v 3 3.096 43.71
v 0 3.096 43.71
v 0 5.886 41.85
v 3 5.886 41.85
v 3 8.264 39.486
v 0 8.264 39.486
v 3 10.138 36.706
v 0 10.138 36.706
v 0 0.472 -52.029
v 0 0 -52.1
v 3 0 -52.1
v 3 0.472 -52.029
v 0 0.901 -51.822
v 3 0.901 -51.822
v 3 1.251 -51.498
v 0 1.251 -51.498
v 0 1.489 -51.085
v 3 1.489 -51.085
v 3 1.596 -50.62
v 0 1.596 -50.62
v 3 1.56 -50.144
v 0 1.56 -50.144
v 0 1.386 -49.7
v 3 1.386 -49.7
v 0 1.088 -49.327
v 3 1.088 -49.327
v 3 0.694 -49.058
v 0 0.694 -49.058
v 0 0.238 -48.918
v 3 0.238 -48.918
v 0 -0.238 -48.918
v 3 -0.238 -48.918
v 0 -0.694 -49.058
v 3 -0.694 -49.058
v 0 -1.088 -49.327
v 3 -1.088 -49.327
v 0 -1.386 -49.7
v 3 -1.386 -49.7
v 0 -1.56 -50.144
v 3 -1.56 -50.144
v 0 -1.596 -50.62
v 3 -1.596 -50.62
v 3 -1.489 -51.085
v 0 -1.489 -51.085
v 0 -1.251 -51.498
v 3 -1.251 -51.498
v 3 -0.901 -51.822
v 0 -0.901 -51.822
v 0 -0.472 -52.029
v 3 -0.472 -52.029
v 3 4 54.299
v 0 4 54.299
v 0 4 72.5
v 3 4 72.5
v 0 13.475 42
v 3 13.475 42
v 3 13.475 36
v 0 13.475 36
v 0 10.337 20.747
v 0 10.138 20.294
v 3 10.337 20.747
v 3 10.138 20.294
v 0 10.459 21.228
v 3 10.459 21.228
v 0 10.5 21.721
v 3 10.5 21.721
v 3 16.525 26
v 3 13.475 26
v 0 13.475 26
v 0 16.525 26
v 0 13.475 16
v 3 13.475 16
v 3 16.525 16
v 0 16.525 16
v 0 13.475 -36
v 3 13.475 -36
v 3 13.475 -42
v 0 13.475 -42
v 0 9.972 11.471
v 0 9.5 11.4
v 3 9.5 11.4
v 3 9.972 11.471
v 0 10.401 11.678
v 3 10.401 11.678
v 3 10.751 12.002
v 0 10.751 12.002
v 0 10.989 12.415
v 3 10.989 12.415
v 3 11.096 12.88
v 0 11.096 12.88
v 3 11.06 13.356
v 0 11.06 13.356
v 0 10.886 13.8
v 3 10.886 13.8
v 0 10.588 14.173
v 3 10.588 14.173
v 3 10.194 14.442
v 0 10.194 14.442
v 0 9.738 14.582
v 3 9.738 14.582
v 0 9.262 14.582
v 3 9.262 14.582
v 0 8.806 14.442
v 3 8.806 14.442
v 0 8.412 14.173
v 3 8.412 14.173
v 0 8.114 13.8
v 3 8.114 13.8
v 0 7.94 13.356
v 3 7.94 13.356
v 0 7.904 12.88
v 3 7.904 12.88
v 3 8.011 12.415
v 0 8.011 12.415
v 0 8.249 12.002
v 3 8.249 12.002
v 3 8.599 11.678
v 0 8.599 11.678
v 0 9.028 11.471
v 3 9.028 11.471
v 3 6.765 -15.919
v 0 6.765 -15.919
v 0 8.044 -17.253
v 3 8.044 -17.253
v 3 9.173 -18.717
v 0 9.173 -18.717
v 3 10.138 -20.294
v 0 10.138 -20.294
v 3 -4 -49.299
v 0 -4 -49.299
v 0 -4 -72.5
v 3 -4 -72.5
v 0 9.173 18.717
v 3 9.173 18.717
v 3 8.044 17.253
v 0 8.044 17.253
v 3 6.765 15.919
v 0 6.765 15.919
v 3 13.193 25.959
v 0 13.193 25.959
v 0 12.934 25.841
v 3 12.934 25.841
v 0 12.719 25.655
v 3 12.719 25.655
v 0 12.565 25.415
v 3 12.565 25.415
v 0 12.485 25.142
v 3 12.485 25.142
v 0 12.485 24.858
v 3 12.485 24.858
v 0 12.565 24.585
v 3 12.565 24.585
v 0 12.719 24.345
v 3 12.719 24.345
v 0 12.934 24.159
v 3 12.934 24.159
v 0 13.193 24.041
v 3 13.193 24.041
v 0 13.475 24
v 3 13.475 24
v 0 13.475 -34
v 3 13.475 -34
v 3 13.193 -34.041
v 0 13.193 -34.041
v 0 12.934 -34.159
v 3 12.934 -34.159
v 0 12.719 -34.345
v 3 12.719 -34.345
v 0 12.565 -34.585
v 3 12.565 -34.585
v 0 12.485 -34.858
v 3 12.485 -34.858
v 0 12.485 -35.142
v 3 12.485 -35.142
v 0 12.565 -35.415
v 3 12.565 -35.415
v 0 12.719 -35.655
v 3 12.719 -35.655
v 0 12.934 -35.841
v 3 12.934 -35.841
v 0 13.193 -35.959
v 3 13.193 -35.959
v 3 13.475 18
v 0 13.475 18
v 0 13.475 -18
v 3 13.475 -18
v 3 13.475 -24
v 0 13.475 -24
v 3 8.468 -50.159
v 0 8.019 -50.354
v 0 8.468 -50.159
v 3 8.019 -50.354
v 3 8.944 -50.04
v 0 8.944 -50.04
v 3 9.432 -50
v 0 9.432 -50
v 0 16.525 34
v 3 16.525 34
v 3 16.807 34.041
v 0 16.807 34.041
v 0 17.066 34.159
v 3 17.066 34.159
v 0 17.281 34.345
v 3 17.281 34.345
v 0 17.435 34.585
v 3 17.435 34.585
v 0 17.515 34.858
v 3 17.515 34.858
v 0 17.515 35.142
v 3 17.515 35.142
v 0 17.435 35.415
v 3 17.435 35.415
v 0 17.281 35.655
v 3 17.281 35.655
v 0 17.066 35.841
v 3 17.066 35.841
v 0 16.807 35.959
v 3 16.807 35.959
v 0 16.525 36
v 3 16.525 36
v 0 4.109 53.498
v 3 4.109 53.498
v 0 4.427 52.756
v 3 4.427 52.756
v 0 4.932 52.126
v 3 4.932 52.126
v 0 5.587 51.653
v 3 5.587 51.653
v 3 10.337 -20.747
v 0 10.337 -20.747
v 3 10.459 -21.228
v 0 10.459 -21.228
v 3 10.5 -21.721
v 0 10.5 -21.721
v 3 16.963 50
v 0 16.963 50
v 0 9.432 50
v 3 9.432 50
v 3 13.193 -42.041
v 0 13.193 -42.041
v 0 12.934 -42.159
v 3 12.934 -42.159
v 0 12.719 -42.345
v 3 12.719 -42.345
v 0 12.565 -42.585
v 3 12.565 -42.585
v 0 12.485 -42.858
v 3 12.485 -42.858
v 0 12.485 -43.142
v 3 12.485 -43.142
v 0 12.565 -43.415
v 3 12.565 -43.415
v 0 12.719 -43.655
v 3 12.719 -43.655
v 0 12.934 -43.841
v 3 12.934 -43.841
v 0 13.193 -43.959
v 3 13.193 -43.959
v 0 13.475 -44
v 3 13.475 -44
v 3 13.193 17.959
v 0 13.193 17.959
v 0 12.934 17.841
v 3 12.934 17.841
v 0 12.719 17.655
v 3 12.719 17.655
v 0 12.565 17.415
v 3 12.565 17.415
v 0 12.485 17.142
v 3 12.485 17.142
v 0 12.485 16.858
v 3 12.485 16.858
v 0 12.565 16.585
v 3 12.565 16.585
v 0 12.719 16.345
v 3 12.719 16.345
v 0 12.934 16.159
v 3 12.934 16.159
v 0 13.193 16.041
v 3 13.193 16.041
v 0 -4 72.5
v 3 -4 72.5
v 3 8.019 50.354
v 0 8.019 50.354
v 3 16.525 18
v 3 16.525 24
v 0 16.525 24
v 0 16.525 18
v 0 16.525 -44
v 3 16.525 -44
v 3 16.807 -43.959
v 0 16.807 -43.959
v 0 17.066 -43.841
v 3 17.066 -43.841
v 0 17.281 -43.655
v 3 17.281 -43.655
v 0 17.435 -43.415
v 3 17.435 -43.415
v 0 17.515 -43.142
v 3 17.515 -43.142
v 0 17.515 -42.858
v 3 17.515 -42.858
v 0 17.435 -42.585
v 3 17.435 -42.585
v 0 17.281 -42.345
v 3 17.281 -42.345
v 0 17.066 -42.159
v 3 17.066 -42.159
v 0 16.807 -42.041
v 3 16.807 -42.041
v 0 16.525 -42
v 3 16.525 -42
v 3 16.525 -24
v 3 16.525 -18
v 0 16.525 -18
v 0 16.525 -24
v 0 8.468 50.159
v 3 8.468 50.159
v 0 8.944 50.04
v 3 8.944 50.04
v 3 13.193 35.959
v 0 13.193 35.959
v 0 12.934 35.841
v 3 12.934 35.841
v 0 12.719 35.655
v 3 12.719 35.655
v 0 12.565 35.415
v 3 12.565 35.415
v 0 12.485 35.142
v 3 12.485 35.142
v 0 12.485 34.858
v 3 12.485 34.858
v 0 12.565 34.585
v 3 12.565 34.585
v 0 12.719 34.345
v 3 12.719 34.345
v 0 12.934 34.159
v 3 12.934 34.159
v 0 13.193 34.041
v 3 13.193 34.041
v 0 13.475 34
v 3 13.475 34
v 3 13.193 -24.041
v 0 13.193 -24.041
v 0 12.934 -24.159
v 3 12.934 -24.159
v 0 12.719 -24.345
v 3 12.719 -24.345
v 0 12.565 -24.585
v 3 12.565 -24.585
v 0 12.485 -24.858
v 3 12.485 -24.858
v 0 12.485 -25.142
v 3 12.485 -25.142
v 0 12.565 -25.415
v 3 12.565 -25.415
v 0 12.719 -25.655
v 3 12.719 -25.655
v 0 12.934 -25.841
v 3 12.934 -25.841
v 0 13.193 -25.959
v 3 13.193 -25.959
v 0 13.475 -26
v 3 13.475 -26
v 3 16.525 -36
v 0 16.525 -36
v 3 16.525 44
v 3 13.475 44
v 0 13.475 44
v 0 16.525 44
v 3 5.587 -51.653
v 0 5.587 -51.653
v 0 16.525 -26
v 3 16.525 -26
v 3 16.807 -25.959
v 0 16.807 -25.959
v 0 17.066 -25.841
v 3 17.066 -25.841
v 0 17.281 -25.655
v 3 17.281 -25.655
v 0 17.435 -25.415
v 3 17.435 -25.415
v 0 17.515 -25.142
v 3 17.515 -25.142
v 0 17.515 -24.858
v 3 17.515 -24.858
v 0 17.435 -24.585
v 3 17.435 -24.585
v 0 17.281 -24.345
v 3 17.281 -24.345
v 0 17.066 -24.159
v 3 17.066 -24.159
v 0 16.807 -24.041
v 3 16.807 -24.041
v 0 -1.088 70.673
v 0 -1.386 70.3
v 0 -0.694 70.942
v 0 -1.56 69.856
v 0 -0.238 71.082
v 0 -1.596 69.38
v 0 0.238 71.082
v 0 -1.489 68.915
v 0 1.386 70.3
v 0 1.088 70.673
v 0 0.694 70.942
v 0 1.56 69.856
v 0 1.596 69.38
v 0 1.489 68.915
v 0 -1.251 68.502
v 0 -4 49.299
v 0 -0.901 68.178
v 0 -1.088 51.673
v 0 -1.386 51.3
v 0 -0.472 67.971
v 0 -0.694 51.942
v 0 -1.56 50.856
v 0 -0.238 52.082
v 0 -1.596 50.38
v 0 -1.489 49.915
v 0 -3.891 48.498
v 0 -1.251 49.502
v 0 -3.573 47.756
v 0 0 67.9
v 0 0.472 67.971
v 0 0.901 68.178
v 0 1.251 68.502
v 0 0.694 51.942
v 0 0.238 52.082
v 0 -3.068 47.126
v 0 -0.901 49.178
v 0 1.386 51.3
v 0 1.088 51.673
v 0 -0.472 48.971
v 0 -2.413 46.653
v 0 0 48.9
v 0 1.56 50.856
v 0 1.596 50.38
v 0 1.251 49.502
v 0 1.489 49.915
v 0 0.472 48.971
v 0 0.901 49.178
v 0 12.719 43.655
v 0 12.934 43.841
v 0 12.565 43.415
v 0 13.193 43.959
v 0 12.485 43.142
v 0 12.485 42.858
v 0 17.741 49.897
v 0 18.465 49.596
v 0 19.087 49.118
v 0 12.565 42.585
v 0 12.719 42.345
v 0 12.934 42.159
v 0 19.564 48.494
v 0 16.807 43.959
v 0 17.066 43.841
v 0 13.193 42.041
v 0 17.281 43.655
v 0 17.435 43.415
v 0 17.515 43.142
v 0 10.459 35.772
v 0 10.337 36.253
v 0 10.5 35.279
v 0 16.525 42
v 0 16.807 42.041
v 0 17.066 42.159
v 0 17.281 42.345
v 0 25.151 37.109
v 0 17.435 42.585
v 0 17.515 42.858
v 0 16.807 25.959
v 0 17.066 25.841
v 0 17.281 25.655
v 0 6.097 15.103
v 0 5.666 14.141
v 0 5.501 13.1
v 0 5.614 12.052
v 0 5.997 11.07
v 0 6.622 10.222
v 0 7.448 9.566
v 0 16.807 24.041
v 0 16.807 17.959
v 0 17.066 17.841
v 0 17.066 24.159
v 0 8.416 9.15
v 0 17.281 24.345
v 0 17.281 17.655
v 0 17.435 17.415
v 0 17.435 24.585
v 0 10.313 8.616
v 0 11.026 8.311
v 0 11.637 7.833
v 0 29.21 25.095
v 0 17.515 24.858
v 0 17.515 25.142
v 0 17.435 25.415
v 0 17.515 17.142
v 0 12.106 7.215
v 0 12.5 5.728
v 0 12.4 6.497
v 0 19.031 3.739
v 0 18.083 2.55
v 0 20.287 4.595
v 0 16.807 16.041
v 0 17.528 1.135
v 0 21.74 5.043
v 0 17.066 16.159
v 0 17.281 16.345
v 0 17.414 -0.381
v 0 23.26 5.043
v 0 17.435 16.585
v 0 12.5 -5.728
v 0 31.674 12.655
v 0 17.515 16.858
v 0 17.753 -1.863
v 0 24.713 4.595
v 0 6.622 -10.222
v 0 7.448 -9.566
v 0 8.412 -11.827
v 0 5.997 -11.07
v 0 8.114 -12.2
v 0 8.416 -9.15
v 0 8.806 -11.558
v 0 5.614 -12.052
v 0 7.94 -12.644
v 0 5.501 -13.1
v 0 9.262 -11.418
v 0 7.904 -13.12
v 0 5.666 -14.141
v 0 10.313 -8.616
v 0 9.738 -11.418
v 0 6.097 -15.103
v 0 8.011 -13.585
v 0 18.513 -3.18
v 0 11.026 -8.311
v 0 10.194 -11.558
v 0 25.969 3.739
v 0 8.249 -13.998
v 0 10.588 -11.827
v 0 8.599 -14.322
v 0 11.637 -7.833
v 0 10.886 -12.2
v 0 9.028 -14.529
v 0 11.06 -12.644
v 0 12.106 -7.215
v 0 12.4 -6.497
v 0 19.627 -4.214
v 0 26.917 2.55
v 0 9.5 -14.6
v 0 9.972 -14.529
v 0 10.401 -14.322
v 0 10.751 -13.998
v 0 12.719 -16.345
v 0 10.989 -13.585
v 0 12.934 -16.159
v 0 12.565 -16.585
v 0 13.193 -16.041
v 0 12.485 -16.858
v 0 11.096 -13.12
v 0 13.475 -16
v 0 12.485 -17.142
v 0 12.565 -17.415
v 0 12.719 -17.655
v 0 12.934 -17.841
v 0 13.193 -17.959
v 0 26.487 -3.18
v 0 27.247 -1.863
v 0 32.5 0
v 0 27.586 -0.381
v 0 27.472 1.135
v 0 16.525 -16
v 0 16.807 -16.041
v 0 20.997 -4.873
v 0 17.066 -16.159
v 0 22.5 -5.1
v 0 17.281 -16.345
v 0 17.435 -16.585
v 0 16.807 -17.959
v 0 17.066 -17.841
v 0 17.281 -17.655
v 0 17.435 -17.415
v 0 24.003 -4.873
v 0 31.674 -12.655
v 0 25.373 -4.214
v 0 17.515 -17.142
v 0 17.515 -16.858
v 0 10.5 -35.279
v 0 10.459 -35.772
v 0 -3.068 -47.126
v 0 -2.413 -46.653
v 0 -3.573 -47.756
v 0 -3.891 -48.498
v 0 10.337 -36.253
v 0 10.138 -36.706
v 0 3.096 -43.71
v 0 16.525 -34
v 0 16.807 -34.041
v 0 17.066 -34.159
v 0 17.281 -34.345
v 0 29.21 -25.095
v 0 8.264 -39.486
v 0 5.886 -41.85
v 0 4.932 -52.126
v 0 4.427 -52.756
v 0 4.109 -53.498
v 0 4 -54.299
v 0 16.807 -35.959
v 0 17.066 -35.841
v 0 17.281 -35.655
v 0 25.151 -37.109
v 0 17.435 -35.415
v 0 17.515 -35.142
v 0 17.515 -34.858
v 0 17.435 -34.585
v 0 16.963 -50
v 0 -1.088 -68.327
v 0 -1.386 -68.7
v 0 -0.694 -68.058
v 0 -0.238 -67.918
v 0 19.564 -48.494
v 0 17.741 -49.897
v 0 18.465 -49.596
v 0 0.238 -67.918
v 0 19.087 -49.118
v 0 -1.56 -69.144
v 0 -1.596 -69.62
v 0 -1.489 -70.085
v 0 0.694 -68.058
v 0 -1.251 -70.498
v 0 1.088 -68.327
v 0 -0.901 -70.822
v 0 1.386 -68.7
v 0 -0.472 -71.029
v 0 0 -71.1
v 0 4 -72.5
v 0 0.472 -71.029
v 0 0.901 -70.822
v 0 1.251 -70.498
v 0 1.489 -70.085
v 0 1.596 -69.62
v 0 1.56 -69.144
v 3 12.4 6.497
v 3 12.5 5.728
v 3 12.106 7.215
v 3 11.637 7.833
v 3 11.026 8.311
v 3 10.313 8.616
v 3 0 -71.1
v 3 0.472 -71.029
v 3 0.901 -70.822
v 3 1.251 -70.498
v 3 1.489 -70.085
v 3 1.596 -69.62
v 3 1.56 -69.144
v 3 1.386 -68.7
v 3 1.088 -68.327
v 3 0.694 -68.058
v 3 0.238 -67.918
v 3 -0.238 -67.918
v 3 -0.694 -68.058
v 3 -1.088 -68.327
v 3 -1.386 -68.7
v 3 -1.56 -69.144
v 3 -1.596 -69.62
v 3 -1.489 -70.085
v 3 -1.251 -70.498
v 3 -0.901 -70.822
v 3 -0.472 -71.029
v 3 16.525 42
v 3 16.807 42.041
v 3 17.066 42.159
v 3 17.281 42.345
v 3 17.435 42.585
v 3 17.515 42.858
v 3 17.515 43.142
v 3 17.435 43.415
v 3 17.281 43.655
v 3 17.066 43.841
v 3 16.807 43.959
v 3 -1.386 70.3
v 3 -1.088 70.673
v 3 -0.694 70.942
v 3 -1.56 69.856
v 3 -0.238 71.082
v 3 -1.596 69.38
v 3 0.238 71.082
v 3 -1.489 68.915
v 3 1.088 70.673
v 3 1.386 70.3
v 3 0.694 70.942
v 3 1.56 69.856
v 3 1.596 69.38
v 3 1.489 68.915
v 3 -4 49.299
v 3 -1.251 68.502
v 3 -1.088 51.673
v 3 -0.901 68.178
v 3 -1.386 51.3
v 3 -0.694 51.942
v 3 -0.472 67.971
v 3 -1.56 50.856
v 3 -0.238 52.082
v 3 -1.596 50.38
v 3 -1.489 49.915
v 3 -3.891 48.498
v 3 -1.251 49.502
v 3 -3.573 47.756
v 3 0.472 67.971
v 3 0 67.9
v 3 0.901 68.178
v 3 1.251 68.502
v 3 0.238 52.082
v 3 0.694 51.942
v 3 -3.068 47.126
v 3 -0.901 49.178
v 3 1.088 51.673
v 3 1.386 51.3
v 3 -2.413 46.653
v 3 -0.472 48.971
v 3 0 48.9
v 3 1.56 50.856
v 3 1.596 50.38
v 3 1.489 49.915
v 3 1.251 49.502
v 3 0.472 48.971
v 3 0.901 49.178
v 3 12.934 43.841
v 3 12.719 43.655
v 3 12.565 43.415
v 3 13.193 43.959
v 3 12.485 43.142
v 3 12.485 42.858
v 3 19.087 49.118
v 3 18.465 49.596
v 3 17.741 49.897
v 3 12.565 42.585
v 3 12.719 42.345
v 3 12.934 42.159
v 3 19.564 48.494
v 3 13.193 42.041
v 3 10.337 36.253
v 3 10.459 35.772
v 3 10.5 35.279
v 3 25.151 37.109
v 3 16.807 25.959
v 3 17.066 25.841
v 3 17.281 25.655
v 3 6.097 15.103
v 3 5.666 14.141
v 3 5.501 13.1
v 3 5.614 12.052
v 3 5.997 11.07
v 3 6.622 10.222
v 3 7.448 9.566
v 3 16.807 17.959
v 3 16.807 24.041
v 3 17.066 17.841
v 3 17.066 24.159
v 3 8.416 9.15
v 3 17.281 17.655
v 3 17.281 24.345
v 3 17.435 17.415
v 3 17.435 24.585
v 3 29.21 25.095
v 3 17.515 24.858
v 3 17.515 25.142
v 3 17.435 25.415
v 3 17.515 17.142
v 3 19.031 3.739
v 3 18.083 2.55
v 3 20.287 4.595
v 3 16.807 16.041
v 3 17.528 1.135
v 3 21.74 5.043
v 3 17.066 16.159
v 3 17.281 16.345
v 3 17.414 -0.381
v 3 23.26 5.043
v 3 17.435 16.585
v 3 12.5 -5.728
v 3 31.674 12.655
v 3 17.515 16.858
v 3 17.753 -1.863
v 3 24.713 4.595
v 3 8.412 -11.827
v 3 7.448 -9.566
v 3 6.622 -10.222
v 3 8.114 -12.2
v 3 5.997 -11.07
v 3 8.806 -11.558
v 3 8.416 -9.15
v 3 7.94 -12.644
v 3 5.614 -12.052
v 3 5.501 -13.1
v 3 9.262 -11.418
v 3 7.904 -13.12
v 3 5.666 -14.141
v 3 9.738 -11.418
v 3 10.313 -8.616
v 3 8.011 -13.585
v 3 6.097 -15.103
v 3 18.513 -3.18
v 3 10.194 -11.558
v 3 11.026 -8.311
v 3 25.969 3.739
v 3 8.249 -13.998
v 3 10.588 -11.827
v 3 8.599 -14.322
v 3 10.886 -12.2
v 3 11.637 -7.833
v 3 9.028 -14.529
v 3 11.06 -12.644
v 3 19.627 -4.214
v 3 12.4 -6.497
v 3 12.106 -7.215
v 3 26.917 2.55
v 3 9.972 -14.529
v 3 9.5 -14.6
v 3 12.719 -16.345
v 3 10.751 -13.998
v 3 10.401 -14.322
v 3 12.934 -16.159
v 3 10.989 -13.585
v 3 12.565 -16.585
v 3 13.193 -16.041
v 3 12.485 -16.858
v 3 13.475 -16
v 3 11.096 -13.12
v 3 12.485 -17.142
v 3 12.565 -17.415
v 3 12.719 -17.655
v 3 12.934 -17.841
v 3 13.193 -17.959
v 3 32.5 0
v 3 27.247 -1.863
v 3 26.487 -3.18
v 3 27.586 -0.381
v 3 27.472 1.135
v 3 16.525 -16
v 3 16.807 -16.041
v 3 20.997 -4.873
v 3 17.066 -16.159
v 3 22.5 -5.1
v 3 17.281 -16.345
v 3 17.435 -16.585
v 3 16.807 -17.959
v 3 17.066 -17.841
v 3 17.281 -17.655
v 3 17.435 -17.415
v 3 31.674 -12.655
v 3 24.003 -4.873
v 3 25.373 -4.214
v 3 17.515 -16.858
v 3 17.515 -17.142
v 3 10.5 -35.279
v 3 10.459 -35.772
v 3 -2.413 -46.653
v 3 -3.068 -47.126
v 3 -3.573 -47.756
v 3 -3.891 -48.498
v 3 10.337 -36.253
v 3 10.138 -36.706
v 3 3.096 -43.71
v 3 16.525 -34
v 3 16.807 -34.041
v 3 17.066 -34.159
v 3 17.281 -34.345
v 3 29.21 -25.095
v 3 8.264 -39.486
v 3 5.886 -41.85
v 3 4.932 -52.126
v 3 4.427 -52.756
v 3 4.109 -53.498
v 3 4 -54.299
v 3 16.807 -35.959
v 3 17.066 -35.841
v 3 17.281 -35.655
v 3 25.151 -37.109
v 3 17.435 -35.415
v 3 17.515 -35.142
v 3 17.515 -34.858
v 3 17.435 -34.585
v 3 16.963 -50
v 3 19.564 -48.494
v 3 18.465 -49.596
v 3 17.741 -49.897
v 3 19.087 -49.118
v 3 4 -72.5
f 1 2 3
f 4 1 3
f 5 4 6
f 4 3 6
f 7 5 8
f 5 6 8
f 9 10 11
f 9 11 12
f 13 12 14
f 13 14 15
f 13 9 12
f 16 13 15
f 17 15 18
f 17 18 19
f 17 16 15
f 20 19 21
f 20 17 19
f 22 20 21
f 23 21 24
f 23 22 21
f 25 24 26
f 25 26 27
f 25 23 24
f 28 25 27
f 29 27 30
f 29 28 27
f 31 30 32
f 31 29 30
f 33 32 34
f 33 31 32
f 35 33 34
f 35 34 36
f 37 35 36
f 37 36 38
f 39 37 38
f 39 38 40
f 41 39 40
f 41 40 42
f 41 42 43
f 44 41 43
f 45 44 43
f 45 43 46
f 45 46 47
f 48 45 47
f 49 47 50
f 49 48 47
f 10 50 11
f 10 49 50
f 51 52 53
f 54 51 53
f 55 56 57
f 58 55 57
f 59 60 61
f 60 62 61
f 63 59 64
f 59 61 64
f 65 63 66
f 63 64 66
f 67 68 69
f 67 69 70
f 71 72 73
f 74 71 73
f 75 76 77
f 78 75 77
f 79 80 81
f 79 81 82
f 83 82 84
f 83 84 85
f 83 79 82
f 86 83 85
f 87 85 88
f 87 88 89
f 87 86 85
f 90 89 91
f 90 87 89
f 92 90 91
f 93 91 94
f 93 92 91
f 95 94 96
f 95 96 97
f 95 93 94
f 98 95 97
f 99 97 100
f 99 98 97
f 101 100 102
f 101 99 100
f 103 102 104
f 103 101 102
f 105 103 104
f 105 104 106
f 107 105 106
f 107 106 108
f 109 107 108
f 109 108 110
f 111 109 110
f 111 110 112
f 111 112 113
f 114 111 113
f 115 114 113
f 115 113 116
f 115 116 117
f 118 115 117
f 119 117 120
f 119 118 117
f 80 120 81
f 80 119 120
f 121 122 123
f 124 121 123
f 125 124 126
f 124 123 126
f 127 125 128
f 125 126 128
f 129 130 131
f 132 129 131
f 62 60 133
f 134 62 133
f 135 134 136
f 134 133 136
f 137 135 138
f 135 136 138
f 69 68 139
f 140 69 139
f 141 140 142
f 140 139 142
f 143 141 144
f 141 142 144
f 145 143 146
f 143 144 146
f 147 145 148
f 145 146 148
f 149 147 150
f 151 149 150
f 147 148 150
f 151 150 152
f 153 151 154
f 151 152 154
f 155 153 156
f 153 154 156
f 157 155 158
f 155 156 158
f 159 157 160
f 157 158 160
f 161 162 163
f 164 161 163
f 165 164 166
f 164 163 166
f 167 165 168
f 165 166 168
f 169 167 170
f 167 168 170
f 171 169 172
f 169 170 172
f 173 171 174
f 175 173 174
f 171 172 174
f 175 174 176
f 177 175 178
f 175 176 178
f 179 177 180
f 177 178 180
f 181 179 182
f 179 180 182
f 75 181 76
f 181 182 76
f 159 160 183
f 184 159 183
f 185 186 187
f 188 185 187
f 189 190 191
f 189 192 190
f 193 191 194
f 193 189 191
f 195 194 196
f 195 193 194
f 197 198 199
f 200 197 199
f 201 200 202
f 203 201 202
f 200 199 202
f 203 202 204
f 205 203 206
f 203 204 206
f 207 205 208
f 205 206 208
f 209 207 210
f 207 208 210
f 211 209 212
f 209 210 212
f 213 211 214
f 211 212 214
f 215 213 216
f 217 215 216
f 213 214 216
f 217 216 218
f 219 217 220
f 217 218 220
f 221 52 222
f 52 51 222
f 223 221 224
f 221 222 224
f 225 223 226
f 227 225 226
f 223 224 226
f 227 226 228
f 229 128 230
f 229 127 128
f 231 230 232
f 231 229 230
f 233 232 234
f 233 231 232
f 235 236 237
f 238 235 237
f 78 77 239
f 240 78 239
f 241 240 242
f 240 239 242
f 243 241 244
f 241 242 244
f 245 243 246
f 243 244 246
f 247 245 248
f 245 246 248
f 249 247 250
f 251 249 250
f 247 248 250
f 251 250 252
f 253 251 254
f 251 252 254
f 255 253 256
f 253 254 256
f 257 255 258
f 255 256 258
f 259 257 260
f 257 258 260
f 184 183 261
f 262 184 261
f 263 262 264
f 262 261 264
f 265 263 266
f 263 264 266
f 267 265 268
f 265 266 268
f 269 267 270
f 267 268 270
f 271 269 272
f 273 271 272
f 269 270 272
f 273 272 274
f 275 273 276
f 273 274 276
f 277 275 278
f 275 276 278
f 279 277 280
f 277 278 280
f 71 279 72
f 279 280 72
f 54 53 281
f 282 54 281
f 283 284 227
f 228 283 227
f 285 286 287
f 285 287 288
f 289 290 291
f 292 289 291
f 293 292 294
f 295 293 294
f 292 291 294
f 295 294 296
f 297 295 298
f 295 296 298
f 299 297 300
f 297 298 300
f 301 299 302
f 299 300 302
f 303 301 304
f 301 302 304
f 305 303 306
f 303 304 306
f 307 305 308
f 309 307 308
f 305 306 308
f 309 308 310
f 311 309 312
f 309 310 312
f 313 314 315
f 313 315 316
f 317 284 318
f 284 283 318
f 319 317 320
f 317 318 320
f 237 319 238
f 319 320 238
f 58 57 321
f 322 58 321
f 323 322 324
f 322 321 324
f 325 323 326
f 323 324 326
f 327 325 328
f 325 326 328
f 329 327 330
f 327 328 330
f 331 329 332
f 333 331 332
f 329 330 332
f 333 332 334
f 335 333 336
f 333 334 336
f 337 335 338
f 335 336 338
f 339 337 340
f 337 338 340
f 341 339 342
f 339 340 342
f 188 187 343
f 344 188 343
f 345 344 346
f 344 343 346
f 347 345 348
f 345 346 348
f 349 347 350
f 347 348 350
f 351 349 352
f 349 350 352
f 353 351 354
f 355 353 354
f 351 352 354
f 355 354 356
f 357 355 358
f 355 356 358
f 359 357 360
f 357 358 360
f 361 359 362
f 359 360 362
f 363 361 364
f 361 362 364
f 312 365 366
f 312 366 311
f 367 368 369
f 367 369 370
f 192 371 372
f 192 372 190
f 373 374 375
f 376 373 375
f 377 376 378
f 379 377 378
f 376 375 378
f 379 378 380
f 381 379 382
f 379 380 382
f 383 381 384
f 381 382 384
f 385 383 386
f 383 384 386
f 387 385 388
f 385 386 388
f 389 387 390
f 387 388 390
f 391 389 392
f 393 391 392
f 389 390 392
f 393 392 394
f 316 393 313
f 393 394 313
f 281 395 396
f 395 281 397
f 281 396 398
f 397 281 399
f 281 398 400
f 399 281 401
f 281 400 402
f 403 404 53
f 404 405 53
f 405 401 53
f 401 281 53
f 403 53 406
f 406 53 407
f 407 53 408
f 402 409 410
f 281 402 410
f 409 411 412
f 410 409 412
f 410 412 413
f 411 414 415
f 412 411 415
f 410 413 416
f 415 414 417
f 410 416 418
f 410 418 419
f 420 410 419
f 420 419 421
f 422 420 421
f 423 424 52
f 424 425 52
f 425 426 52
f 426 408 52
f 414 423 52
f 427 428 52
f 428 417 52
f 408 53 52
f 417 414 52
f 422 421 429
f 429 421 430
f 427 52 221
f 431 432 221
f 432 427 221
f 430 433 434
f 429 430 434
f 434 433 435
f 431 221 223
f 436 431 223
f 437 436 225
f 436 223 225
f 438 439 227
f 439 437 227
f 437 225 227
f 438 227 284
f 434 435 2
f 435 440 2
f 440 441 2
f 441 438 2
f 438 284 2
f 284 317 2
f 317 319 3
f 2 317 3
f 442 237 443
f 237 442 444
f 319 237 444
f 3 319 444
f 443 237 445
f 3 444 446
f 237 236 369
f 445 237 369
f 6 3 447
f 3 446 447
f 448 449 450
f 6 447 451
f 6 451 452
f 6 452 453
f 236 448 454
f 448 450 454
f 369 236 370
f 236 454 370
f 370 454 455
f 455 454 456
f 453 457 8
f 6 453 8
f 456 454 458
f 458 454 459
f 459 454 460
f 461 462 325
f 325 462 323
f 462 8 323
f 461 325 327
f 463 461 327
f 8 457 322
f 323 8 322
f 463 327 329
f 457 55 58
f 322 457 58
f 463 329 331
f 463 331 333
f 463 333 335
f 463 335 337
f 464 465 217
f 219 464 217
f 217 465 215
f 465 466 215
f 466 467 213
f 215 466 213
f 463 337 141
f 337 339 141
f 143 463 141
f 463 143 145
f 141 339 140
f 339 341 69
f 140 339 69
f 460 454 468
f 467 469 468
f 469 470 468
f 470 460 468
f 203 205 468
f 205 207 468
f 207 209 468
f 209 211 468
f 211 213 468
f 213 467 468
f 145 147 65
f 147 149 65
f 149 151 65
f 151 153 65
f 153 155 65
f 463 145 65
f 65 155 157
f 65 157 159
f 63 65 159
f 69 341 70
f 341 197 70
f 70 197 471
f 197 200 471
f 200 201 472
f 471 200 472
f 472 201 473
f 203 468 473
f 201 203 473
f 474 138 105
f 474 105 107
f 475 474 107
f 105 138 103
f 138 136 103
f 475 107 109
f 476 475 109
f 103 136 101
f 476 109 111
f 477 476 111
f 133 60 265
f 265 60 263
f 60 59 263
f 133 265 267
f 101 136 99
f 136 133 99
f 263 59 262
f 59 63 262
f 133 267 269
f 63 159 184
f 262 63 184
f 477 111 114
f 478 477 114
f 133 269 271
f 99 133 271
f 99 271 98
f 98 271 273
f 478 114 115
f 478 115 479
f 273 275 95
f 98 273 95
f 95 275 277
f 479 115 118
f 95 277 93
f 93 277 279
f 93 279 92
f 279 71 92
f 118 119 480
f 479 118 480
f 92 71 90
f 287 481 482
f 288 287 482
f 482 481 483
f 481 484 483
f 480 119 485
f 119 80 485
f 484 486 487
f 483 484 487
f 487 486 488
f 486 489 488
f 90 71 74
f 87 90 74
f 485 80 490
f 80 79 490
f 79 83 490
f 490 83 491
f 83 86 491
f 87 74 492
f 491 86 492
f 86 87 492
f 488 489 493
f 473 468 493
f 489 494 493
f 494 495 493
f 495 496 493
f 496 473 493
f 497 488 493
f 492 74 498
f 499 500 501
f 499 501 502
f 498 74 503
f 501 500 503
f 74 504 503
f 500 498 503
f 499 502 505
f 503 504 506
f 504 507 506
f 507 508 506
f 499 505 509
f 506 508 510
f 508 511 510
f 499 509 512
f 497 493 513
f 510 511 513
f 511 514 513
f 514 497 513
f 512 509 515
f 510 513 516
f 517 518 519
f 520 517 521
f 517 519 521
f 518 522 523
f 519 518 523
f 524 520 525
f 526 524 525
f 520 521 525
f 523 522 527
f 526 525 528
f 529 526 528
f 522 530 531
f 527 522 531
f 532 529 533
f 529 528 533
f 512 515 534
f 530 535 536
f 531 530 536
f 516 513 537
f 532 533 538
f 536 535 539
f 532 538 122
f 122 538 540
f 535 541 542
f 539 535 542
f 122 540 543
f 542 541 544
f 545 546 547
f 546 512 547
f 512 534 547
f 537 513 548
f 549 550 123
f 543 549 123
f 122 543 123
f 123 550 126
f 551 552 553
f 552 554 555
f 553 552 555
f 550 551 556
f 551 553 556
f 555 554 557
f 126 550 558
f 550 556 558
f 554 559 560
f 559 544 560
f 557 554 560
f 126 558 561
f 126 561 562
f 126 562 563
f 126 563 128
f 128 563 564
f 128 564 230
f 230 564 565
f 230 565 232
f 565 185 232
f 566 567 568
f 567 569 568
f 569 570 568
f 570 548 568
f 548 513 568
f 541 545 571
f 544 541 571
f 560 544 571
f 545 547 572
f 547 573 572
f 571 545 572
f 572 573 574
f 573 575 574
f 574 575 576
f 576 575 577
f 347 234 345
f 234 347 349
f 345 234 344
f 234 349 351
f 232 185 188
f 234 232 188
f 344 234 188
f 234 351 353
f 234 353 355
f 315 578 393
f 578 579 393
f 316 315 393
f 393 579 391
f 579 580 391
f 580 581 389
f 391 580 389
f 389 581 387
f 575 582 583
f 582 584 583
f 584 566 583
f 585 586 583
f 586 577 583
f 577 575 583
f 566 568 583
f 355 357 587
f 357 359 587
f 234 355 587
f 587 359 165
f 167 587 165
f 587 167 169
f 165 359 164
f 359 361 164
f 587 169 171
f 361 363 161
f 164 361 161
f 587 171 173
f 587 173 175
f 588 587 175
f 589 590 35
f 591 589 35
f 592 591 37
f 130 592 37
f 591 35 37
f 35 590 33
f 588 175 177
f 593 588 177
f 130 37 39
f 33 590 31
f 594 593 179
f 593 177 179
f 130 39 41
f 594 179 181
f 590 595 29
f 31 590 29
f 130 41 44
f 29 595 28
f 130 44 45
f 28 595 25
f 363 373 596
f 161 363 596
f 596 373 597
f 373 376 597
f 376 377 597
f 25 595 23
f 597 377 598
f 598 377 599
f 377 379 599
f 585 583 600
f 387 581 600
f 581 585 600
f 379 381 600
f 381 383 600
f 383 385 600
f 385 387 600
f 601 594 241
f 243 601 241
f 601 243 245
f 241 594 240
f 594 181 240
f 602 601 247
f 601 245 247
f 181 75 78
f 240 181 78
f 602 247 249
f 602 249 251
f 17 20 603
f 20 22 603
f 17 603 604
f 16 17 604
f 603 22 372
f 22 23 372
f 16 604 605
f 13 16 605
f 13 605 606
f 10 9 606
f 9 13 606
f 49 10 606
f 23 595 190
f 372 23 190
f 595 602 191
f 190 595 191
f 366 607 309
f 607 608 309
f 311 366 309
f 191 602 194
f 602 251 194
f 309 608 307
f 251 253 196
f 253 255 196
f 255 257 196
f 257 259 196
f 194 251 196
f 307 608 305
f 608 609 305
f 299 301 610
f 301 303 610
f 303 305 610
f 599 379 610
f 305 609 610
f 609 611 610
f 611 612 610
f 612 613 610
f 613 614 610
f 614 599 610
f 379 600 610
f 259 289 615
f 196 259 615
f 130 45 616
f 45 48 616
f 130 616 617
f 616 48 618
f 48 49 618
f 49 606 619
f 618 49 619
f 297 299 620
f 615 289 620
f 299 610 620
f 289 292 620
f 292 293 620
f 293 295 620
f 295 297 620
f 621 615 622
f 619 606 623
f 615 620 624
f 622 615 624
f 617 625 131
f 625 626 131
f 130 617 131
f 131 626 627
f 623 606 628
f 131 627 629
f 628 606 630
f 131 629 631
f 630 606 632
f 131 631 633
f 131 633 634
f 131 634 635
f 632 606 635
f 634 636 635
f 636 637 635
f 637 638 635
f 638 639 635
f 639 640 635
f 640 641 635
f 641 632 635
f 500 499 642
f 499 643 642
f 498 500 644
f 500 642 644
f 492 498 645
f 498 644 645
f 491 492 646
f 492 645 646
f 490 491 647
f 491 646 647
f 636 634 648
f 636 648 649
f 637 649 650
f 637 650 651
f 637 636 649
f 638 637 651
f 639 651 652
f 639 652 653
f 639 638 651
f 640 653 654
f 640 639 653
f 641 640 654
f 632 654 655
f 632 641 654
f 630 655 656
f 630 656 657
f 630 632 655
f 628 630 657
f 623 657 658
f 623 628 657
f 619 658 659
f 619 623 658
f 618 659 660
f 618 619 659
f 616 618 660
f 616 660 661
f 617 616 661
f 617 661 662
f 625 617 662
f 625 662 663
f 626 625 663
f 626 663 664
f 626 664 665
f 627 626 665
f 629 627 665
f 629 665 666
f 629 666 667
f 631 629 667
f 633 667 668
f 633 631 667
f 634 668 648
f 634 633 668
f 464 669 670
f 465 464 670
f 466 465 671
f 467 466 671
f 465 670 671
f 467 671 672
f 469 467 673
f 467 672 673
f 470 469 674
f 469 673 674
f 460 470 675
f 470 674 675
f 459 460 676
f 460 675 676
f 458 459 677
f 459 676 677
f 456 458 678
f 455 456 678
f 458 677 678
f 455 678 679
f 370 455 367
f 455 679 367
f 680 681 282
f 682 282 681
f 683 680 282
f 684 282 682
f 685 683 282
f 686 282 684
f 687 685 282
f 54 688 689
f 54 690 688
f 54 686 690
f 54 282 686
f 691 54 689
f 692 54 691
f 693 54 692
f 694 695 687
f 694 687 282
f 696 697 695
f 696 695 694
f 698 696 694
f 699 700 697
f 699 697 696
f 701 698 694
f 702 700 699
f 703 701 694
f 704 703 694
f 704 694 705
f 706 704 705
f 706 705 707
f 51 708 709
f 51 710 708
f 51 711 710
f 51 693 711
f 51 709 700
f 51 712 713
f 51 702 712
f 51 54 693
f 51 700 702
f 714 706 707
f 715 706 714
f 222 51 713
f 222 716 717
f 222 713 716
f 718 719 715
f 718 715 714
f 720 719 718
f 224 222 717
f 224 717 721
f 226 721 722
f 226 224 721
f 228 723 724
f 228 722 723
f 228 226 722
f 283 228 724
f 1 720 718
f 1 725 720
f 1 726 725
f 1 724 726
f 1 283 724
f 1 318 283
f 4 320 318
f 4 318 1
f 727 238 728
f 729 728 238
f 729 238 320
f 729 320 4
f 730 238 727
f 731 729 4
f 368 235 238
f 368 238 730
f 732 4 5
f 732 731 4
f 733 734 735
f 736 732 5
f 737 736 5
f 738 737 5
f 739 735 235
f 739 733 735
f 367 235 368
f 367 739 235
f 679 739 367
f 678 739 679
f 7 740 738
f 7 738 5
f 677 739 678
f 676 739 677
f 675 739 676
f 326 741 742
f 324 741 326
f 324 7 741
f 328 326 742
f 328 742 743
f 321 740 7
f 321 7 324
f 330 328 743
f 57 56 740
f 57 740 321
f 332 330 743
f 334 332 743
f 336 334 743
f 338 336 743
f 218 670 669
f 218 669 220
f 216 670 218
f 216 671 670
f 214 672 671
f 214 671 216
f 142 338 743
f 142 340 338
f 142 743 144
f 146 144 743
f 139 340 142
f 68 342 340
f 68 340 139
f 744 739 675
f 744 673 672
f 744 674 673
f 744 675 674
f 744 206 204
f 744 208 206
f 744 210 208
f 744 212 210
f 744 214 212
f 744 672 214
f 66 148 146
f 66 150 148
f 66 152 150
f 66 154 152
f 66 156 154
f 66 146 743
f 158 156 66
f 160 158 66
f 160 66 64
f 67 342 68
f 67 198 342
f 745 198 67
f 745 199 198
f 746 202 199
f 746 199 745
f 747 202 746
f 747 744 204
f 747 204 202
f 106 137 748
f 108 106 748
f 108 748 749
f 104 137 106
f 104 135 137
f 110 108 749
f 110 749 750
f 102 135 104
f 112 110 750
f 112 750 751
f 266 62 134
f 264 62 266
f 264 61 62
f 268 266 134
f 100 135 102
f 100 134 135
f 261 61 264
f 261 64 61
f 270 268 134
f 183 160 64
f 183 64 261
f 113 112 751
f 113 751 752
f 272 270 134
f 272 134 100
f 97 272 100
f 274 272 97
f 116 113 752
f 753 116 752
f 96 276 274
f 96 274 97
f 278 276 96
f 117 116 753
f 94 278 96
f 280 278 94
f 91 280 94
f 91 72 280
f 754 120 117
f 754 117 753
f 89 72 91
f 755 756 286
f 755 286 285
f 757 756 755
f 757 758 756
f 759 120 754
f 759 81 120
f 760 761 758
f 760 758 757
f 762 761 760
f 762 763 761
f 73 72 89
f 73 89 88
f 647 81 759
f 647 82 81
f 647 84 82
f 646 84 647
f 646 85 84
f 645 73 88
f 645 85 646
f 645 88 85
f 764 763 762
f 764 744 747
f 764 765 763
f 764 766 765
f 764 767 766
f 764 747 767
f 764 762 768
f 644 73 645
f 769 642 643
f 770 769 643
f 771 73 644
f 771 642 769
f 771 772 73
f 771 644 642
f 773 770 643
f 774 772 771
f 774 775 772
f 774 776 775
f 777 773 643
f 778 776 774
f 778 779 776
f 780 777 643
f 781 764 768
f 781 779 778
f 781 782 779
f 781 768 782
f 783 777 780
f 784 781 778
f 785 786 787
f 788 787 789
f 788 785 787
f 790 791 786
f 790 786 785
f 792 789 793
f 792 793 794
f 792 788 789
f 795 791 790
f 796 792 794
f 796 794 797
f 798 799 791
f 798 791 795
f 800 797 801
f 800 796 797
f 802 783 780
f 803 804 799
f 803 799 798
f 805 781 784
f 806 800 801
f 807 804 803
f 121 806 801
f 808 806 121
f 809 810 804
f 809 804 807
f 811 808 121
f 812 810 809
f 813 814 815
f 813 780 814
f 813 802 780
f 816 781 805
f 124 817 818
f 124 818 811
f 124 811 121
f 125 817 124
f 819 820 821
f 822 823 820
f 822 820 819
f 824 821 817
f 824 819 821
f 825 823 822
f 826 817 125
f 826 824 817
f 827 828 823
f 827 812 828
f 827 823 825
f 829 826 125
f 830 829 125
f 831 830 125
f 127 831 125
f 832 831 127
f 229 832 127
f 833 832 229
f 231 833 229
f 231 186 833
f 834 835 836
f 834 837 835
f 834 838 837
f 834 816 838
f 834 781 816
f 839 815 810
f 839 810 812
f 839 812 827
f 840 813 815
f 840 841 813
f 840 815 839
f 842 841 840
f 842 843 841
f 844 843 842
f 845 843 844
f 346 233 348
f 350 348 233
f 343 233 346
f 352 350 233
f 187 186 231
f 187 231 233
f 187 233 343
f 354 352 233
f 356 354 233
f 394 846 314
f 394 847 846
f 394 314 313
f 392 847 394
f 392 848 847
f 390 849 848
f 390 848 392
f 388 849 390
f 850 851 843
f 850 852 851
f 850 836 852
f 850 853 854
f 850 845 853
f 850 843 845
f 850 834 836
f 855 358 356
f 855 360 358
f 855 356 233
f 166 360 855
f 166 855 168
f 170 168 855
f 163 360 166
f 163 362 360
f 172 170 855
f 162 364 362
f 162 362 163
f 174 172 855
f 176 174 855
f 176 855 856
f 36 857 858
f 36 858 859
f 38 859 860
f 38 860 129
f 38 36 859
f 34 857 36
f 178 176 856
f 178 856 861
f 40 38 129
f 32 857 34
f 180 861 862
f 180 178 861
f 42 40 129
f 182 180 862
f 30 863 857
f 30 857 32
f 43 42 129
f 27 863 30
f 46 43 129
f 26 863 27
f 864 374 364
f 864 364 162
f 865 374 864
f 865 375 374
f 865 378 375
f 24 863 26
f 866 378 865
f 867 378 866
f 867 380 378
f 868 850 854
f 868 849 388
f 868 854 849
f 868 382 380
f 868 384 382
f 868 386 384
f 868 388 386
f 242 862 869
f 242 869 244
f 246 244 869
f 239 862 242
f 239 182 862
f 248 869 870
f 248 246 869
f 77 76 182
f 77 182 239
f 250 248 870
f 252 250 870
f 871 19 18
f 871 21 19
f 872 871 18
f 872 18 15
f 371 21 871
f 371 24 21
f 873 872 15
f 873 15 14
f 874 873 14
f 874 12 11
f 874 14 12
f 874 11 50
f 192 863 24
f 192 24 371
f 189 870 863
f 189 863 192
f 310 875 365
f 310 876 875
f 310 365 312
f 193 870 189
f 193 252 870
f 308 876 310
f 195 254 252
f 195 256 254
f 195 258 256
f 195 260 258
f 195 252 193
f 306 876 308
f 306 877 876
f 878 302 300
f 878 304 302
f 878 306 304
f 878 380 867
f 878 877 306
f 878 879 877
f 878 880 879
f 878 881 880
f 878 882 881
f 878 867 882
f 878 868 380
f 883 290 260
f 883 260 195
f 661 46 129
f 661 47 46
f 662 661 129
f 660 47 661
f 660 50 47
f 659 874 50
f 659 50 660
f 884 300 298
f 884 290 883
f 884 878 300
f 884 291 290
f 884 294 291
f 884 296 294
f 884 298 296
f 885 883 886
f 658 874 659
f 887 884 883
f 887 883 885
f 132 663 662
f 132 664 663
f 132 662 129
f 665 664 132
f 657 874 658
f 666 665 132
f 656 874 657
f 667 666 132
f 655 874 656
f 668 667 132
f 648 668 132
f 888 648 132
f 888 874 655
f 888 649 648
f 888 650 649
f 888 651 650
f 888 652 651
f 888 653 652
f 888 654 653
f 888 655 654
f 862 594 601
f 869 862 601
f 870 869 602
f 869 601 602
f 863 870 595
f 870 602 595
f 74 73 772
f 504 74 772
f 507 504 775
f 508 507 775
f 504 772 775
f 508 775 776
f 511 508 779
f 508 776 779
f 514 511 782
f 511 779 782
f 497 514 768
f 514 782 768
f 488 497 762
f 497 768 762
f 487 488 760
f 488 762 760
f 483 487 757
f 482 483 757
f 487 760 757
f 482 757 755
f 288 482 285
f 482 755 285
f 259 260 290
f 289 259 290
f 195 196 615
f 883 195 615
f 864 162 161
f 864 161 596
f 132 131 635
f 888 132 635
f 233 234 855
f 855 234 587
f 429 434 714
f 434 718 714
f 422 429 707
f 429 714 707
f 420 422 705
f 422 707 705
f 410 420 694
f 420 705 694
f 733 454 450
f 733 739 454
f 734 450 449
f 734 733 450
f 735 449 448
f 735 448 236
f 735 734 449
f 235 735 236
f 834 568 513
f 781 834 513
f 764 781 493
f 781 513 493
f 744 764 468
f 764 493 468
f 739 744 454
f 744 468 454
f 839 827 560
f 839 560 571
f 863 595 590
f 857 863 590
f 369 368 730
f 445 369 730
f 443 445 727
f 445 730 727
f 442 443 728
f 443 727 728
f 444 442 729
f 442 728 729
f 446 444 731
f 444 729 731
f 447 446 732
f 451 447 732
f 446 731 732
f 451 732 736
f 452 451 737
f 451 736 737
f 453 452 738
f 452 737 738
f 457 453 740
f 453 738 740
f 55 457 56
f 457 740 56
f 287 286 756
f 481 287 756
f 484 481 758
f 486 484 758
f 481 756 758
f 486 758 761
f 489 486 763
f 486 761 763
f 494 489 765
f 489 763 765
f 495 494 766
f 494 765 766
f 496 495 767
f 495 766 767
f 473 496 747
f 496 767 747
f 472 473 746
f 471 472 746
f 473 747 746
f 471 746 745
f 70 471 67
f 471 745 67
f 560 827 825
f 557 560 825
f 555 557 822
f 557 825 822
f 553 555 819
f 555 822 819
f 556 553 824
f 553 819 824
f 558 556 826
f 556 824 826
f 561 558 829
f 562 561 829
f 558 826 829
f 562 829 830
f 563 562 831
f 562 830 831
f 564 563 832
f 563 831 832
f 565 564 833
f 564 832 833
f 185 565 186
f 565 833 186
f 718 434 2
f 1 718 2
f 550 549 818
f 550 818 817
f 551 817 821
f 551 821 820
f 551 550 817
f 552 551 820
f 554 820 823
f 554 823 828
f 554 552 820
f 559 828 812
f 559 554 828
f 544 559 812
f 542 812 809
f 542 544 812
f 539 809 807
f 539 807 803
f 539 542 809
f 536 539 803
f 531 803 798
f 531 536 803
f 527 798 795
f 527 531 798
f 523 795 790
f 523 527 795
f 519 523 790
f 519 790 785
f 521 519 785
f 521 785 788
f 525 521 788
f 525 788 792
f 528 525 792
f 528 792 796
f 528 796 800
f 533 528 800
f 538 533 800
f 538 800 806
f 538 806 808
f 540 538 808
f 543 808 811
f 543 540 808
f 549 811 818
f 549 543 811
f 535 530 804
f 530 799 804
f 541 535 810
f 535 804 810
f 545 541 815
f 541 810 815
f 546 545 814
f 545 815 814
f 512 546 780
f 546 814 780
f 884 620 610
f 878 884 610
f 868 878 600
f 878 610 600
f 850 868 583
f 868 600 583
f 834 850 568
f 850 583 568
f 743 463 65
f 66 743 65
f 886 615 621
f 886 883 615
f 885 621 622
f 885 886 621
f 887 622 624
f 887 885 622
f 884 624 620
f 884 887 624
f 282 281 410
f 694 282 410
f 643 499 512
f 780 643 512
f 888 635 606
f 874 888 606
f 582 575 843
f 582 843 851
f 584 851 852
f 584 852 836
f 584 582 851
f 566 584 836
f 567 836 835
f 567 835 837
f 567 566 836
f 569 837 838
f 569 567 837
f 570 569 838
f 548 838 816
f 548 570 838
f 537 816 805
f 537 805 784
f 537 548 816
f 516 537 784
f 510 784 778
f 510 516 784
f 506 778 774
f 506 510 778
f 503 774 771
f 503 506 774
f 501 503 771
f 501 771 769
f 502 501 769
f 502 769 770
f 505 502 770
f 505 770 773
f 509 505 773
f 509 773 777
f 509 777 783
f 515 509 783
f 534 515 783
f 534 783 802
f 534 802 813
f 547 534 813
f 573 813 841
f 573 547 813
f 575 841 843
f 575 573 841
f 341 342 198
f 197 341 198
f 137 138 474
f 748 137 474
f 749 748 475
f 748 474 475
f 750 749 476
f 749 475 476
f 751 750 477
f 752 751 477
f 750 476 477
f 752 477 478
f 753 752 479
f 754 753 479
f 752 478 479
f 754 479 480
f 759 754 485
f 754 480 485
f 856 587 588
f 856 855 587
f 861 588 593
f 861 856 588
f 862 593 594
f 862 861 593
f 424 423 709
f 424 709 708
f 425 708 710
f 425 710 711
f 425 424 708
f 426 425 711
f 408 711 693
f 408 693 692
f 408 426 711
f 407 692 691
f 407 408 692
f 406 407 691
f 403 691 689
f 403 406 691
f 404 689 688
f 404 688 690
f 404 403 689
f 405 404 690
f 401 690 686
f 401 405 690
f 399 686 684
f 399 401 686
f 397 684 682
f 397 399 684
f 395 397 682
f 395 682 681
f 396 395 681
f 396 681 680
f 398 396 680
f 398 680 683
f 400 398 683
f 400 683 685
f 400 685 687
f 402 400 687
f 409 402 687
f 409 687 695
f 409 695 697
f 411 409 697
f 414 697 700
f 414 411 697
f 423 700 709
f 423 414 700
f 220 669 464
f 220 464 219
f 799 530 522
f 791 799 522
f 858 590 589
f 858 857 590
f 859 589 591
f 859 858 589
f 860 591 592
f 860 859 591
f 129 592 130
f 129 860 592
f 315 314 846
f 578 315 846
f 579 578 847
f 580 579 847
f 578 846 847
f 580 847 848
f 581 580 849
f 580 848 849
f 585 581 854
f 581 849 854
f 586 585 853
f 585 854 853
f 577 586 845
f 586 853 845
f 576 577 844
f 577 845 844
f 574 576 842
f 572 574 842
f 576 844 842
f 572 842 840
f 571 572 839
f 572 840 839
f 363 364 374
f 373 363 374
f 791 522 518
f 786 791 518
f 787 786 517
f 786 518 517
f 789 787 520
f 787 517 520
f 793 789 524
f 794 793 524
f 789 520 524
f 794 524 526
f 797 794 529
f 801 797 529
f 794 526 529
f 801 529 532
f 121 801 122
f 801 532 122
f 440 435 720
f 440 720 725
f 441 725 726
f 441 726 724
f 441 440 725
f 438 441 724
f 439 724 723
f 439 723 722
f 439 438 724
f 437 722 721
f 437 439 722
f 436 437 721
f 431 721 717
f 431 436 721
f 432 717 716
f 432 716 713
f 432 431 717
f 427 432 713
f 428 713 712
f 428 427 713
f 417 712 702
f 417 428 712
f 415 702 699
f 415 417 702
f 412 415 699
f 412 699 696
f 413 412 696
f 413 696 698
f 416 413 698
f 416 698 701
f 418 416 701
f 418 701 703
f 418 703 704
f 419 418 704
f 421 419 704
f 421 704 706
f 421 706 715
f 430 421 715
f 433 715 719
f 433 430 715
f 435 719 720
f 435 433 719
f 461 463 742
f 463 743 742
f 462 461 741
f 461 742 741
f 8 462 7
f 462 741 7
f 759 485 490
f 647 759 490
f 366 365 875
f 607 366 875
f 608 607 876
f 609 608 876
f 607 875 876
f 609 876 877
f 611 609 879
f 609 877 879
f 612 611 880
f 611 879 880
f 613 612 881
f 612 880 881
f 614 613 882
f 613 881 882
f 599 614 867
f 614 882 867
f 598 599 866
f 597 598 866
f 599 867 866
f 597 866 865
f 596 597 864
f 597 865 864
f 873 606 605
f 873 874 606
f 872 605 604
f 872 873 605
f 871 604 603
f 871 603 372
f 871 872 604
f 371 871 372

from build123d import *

# Parameters (mm, degrees)
SKETCH_2_R          = 1.6
SKETCH_2_R_2        = 10
SKETCH_2_R_3        = 5.1
SKETCH_2_R_4        = 4
EXTRUDE_1_DEPTH     = 3
SKETCH_3_R          = 1
SKETCH_3_W          = 10
SKETCH_3_H          = 3.05
CUT_EXTRUDE_1_DEPTH = 80.507861247
FILLET_1_R          = 3


with BuildPart() as part:
    # 草图2 → 凸台-拉伸1 (new body)
    # profile 1 of 5: a face of its own
    with BuildSketch(Plane(origin=(0, 0, 0), x_dir=(0, 0, -1), z_dir=(1, 0, 0))):
        with BuildLine():
            Line((-72.5, -4), (-47.5, -4))
            Line((-47.5, -4), (-43.710028433, 3.096407942))
            ThreePointArc((-43.710028433, 3.096407942), (-40.443183901, 7.410718134), (-36, 10.5))
            Line((-36, 10.5), (-21, 10.5))
            ThreePointArc((-21, 10.5), (-18.287060326, 8.866629069), (-15.918567159, 6.764681785))
            ThreePointArc((-15.918567159, 6.764681785), (-14.470668447, 13.219829878), (-9, 9.5))
            ThreePointArc((-9, 9.5), (-9.03759069, 8.952905441), (-9.149656228, 8.416093713))
            Line((-9.149656228, 8.416093713), (-8, 12.5))
            Line((-8, 12.5), (0, 12.5))
            ThreePointArc((0, 12.5), (-10, 22.500000014), (2.8e-08, 32.5))
            ThreePointArc((2.8e-08, 32.5), (-25.937249131, 28.981693295), (-50, 18.681042995))
            Line((-50, 18.681042995), (-50, 8.681042995))
            Line((-50, 8.681042995), (-52.5, 4))
            Line((-52.5, 4), (-72.5, 4))
            Line((-72.5, 4), (-72.5, -4))
        make_face()
        with Locations((-69.5, 0)):
            Circle(SKETCH_2_R, mode=Mode.SUBTRACT)
        with Locations((-50.5, 0)):
            Circle(SKETCH_2_R, mode=Mode.SUBTRACT)
    # profile 2 of 5: a face of its own
    with BuildSketch(Plane(origin=(0, 0, 0), x_dir=(0, 0, -1), z_dir=(1, 0, 0))):
        with BuildLine():
            ThreePointArc((50, 18.681042995), (25.937249158, 28.981693288), (2.8e-08, 32.5))
            ThreePointArc((2.8e-08, 32.5), (7.071067822, 29.571067802), (10, 22.5))
            ThreePointArc((10, 22.5), (7.071067812, 15.428932188), (0, 12.5))
            Line((0, 12.5), (8, 12.5))
            Line((8, 12.5), (9.149656228, 8.416093713))
            ThreePointArc((9.149656228, 8.416093713), (12.452905441, 13.46240931), (17, 9.5))
            ThreePointArc((17, 9.5), (16.719829878, 8.029331553), (15.918567159, 6.764681785))
            ThreePointArc((15.918567159, 6.764681785), (18.287060326, 8.866629069), (21, 10.5))
            Line((21, 10.5), (36, 10.5))
            ThreePointArc((36, 10.5), (40.443183901, 7.410718134), (43.710028433, 3.096407942))
            Line((43.710028433, 3.096407942), (47.5, -4))
            Line((47.5, -4), (72.5, -4))
            Line((72.5, -4), (72.5, 4))
            Line((72.5, 4), (52.5, 4))
            Line((52.5, 4), (50, 8.681042995))
            Line((50, 8.681042995), (50, 18.681042995))
        make_face()
        with Locations((50.5, 0)):
            Circle(SKETCH_2_R, mode=Mode.SUBTRACT)
        with Locations((69.5, 0)):
            Circle(SKETCH_2_R, mode=Mode.SUBTRACT)
    # profile 3 of 5: a face of its own
    with BuildSketch(Plane(origin=(0, 0, 0), x_dir=(0, 0, -1), z_dir=(1, 0, 0))):
        with Locations((0, 22.5)):
            Circle(SKETCH_2_R_2)
        with Locations((0, 22.5)):
            Circle(SKETCH_2_R_3, mode=Mode.SUBTRACT)
    # profile 4 of 5: a face of its own
    with BuildSketch(Plane(origin=(0, 0, 0), x_dir=(0, 0, -1), z_dir=(1, 0, 0))):
        with Locations((-13, 9.5)):
            Circle(SKETCH_2_R_4)
        with Locations((-13, 9.5)):
            Circle(SKETCH_2_R, mode=Mode.SUBTRACT)
    # profile 5 of 5: a face of its own
    with BuildSketch(Plane(origin=(0, 0, 0), x_dir=(0, 0, -1), z_dir=(1, 0, 0))):
        with Locations((13, 9.5)):
            Circle(SKETCH_2_R_4)
        with Locations((13, 9.5)):
            Circle(SKETCH_2_R, mode=Mode.SUBTRACT)
    extrude(amount=EXTRUDE_1_DEPTH)

    # 草图3 → 切除-拉伸1 (cut, through all)
    with BuildSketch(Plane(origin=(3, 0, 0), x_dir=(0, 0, -1), z_dir=(1, 0, 0))):
        with Locations((-43, 16.525)):
            Circle(SKETCH_3_R)
        with Locations((-43, 13.475)):
            Circle(SKETCH_3_R)
        with Locations((-35, 16.525)):
            Circle(SKETCH_3_R)
        with Locations((-35, 13.475)):
            Circle(SKETCH_3_R)
        with Locations((-25, 16.525)):
            Circle(SKETCH_3_R)
        with Locations((-17, 16.525)):
            Circle(SKETCH_3_R)
        with Locations((-17, 13.475)):
            Circle(SKETCH_3_R)
        with Locations((-25, 13.475)):
            Circle(SKETCH_3_R)
        with Locations((25, 13.475)):
            Circle(SKETCH_3_R)
        with Locations((17, 13.475)):
            Circle(SKETCH_3_R)
        with Locations((17, 16.525)):
            Circle(SKETCH_3_R)
        with Locations((25, 16.525)):
            Circle(SKETCH_3_R)
        with Locations((35, 13.475)):
            Circle(SKETCH_3_R)
        with Locations((35, 16.525)):
            Circle(SKETCH_3_R)
        with Locations((43, 13.475)):
            Circle(SKETCH_3_R)
        with Locations((43, 16.525)):
            Circle(SKETCH_3_R)
        with Locations((-21, 15)):
            Rectangle(SKETCH_3_W, SKETCH_3_H)
        with Locations((-39, 15)):
            Rectangle(SKETCH_3_W, SKETCH_3_H)
        with Locations((21, 15)):
            Rectangle(SKETCH_3_W, SKETCH_3_H)
        with Locations((39, 15)):
            Rectangle(SKETCH_3_W, SKETCH_3_H)
    extrude(amount=-CUT_EXTRUDE_1_DEPTH, mode=Mode.SUBTRACT)

    # 圆角1
    fillet_1_edges = [part.edges().sort_by_distance(p)[0] for p in [
        (1.5, 10.5, 36),
        (1.5, -4, 47.5),
        (1.5, 4, 52.5),
        (1.5, 8.681042995, 50),
        (1.5, 18.681042995, 50),
        (1.5, 18.681042995, -50),
        (1.5, 8.681042995, -50),
        (1.5, 4, -52.5),
        (1.5, -4, -47.5),
        (1.5, 10.5, -36),
        (1.5, 10.5, -21),
        (1.5, 12.5, -8),
        (1.5, 12.5, 8),
        (1.5, 10.5, 21),
    ]]
    fillet(fillet_1_edges, radius=FILLET_1_R)


solid = part.part
